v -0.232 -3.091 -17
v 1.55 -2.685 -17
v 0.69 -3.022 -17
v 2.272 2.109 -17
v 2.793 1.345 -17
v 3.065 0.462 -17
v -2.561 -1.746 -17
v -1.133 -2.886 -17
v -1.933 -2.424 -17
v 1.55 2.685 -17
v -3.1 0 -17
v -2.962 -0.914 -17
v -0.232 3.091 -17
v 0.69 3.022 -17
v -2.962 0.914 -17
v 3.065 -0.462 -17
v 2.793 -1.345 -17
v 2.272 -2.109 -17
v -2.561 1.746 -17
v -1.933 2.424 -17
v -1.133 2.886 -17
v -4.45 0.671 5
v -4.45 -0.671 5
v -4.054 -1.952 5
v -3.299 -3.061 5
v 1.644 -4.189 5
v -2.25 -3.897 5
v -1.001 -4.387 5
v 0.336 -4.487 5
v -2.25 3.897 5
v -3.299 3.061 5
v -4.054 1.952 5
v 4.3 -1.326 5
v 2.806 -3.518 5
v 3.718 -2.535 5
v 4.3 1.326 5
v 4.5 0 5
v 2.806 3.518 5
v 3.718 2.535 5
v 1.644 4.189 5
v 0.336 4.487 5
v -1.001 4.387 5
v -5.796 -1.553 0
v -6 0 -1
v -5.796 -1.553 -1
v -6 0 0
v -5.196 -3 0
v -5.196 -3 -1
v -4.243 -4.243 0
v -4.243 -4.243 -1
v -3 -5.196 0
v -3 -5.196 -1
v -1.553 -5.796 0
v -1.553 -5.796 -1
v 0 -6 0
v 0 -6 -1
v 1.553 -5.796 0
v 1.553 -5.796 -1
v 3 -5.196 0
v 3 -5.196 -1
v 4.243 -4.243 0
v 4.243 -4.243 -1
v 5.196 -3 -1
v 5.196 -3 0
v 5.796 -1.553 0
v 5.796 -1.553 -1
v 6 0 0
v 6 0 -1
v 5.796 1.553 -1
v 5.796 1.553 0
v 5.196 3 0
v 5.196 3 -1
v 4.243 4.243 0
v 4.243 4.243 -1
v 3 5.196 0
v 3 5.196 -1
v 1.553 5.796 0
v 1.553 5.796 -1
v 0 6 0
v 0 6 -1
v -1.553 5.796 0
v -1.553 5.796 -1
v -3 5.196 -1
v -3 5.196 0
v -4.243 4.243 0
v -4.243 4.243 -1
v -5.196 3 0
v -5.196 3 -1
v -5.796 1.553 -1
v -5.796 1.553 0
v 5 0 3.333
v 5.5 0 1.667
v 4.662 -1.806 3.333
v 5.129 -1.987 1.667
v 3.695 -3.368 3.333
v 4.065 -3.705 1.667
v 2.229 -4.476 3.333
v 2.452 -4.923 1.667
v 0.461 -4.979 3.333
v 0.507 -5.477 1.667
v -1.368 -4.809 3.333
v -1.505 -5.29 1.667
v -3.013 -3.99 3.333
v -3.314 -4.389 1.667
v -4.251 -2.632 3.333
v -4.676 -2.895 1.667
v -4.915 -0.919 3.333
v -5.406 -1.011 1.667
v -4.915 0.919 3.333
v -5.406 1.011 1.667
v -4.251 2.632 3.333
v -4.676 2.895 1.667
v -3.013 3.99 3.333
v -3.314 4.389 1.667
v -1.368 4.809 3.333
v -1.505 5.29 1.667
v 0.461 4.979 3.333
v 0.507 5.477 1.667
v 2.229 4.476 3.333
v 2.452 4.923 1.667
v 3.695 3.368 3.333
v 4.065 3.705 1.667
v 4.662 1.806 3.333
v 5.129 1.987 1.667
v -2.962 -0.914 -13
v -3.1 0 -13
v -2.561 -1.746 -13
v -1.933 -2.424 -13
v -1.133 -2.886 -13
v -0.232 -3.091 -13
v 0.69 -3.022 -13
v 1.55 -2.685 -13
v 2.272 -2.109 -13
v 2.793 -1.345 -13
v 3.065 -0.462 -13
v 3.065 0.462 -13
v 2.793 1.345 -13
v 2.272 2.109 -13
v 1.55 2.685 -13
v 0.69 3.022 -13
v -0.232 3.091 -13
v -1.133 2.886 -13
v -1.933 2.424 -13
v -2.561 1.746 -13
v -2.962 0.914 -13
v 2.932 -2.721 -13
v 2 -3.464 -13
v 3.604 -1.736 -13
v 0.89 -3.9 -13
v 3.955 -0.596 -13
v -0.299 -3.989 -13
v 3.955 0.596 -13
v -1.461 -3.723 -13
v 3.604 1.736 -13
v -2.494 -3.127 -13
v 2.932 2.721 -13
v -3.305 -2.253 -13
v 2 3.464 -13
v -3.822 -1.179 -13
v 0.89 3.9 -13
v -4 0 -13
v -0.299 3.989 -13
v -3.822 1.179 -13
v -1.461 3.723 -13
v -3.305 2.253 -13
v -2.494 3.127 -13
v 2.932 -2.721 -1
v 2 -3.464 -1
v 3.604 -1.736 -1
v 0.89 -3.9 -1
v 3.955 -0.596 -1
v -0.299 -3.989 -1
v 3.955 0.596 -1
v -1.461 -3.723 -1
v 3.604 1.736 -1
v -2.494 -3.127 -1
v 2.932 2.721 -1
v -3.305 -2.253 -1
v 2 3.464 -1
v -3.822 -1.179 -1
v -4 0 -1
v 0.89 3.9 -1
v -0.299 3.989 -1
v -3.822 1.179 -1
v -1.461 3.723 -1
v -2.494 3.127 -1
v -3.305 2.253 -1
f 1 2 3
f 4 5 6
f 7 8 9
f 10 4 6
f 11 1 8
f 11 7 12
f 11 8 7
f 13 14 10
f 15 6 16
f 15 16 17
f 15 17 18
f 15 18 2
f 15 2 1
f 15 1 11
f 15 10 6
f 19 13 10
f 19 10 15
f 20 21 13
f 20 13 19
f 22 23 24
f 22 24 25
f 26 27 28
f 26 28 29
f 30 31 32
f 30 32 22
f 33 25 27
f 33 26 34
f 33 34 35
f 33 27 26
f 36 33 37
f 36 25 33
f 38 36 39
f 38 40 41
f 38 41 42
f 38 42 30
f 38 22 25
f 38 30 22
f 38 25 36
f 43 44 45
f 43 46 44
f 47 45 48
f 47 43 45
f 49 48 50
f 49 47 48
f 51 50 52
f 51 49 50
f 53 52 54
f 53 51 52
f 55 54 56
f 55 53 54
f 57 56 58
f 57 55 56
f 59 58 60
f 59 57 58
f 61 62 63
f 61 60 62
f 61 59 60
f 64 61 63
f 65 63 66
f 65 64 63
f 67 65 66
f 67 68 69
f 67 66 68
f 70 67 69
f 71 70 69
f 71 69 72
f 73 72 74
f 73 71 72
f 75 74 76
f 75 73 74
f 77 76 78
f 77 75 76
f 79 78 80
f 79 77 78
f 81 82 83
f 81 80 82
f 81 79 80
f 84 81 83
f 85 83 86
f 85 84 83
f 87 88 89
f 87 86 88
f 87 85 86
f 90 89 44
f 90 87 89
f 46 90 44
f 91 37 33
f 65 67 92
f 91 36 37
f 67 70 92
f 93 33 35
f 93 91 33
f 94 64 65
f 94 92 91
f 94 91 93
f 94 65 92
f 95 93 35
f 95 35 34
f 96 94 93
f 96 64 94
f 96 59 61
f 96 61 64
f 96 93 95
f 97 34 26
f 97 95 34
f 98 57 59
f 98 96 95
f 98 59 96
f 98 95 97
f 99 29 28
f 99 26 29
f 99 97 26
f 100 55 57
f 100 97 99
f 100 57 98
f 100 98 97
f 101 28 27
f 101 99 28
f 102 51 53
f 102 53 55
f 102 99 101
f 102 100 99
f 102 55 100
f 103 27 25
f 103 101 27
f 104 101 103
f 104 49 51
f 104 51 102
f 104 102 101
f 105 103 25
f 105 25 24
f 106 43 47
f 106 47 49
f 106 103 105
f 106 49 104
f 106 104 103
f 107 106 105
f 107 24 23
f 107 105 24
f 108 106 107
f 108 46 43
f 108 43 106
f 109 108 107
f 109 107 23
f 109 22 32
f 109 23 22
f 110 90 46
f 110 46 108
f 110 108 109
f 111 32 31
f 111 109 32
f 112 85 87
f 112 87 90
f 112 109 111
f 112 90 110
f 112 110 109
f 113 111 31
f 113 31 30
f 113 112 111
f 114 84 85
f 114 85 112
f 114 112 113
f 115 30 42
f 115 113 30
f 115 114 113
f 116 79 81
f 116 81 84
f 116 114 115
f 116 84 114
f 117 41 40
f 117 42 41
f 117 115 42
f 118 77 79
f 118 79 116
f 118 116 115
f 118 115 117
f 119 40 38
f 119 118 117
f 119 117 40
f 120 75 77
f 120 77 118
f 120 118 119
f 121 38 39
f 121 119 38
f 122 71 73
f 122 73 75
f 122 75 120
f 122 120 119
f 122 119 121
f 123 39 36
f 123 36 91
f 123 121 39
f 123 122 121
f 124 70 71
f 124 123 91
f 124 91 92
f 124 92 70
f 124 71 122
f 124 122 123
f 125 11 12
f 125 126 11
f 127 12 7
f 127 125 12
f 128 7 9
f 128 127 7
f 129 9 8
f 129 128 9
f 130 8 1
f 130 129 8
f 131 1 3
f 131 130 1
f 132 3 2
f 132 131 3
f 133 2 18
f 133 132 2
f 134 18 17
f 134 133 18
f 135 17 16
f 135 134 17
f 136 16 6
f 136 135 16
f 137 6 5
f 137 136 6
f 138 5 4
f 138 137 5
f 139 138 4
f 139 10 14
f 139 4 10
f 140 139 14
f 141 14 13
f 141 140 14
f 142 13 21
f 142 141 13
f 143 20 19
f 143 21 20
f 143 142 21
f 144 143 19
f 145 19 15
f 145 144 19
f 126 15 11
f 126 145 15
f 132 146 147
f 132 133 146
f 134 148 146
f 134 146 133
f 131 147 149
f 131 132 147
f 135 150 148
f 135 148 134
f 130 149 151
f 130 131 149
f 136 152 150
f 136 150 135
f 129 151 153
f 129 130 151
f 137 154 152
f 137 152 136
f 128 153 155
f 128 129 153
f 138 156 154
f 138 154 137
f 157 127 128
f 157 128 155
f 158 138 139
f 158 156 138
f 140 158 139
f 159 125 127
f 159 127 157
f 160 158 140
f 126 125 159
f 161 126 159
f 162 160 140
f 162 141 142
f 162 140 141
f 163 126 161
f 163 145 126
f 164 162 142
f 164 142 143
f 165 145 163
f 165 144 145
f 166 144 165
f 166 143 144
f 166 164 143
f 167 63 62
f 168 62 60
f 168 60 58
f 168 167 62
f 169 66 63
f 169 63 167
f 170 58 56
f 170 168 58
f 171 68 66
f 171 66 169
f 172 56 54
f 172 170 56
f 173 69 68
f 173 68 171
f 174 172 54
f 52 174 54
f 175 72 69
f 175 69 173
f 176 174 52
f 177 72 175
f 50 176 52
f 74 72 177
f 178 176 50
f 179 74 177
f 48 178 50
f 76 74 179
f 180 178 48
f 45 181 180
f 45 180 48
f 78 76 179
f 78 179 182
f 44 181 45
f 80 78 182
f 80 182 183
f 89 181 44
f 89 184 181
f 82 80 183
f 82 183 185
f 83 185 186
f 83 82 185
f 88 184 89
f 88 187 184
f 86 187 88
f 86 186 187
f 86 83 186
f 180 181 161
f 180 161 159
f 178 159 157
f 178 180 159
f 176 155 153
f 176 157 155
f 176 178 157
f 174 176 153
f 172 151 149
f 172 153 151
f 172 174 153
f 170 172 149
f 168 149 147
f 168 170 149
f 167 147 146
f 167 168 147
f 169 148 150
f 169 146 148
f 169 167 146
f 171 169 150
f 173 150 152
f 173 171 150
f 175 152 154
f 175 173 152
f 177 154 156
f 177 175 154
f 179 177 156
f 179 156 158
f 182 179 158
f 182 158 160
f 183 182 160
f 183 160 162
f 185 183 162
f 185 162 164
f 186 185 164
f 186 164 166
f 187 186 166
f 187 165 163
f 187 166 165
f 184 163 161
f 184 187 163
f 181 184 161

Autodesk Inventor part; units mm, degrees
ref_plane "YZ Plane" through (0, 0, 0) normal (1, 0, 0) x (0, 1, 0)
ref_plane "XZ Plane" through (0, 0, 0) normal (0, 1, 0) x (-1, 0, 0)
sketch "Sketch2" plane through (0, 0, 0) normal (0, 0, 1) x (1, 0, 0)
  circle A0 centre (0, 0) radius 6
  dimension "d0" = 12
ref_plane "Work Plane1" through (0, 0, 5) normal (0, 0, 1) x (1, 0, 0)
sketch "Sketch3" plane through (0, 0, 5) normal (0, 0, 1) x (1, 0, 0)
  circle A0 centre (0, 0) radius 4.5
  dimension "d2" = 9
loft "Loft1" add profiles "Sketch2", "Sketch3"
sketch "Sketch4" plane through (0, 0, 0) normal (0, 0, -1) x (-1, 0, 0)
  circle A0 centre (0, 0) radius 6 projected
extrude "Extrusion1" add sketch "Sketch4" along normal blind 1
sketch "Sketch5" plane through (0, 0, -1) normal (0, 0, -1) x (-1, 0, 0)
  circle A0 centre (0, 0) radius 4
  dimension "d9" = 8
extrude "Extrusion2" add sketch "Sketch5" along normal blind 12
sketch "Sketch6" plane through (0, 0, -13) normal (0, 0, -1) x (-1, 0, 0)
  circle A0 centre (0, 0) radius 3.1
  dimension "d12" = 6.2
extrude "Extrusion3" add sketch "Sketch6" along normal blind 4
properties part number "driver gear"
